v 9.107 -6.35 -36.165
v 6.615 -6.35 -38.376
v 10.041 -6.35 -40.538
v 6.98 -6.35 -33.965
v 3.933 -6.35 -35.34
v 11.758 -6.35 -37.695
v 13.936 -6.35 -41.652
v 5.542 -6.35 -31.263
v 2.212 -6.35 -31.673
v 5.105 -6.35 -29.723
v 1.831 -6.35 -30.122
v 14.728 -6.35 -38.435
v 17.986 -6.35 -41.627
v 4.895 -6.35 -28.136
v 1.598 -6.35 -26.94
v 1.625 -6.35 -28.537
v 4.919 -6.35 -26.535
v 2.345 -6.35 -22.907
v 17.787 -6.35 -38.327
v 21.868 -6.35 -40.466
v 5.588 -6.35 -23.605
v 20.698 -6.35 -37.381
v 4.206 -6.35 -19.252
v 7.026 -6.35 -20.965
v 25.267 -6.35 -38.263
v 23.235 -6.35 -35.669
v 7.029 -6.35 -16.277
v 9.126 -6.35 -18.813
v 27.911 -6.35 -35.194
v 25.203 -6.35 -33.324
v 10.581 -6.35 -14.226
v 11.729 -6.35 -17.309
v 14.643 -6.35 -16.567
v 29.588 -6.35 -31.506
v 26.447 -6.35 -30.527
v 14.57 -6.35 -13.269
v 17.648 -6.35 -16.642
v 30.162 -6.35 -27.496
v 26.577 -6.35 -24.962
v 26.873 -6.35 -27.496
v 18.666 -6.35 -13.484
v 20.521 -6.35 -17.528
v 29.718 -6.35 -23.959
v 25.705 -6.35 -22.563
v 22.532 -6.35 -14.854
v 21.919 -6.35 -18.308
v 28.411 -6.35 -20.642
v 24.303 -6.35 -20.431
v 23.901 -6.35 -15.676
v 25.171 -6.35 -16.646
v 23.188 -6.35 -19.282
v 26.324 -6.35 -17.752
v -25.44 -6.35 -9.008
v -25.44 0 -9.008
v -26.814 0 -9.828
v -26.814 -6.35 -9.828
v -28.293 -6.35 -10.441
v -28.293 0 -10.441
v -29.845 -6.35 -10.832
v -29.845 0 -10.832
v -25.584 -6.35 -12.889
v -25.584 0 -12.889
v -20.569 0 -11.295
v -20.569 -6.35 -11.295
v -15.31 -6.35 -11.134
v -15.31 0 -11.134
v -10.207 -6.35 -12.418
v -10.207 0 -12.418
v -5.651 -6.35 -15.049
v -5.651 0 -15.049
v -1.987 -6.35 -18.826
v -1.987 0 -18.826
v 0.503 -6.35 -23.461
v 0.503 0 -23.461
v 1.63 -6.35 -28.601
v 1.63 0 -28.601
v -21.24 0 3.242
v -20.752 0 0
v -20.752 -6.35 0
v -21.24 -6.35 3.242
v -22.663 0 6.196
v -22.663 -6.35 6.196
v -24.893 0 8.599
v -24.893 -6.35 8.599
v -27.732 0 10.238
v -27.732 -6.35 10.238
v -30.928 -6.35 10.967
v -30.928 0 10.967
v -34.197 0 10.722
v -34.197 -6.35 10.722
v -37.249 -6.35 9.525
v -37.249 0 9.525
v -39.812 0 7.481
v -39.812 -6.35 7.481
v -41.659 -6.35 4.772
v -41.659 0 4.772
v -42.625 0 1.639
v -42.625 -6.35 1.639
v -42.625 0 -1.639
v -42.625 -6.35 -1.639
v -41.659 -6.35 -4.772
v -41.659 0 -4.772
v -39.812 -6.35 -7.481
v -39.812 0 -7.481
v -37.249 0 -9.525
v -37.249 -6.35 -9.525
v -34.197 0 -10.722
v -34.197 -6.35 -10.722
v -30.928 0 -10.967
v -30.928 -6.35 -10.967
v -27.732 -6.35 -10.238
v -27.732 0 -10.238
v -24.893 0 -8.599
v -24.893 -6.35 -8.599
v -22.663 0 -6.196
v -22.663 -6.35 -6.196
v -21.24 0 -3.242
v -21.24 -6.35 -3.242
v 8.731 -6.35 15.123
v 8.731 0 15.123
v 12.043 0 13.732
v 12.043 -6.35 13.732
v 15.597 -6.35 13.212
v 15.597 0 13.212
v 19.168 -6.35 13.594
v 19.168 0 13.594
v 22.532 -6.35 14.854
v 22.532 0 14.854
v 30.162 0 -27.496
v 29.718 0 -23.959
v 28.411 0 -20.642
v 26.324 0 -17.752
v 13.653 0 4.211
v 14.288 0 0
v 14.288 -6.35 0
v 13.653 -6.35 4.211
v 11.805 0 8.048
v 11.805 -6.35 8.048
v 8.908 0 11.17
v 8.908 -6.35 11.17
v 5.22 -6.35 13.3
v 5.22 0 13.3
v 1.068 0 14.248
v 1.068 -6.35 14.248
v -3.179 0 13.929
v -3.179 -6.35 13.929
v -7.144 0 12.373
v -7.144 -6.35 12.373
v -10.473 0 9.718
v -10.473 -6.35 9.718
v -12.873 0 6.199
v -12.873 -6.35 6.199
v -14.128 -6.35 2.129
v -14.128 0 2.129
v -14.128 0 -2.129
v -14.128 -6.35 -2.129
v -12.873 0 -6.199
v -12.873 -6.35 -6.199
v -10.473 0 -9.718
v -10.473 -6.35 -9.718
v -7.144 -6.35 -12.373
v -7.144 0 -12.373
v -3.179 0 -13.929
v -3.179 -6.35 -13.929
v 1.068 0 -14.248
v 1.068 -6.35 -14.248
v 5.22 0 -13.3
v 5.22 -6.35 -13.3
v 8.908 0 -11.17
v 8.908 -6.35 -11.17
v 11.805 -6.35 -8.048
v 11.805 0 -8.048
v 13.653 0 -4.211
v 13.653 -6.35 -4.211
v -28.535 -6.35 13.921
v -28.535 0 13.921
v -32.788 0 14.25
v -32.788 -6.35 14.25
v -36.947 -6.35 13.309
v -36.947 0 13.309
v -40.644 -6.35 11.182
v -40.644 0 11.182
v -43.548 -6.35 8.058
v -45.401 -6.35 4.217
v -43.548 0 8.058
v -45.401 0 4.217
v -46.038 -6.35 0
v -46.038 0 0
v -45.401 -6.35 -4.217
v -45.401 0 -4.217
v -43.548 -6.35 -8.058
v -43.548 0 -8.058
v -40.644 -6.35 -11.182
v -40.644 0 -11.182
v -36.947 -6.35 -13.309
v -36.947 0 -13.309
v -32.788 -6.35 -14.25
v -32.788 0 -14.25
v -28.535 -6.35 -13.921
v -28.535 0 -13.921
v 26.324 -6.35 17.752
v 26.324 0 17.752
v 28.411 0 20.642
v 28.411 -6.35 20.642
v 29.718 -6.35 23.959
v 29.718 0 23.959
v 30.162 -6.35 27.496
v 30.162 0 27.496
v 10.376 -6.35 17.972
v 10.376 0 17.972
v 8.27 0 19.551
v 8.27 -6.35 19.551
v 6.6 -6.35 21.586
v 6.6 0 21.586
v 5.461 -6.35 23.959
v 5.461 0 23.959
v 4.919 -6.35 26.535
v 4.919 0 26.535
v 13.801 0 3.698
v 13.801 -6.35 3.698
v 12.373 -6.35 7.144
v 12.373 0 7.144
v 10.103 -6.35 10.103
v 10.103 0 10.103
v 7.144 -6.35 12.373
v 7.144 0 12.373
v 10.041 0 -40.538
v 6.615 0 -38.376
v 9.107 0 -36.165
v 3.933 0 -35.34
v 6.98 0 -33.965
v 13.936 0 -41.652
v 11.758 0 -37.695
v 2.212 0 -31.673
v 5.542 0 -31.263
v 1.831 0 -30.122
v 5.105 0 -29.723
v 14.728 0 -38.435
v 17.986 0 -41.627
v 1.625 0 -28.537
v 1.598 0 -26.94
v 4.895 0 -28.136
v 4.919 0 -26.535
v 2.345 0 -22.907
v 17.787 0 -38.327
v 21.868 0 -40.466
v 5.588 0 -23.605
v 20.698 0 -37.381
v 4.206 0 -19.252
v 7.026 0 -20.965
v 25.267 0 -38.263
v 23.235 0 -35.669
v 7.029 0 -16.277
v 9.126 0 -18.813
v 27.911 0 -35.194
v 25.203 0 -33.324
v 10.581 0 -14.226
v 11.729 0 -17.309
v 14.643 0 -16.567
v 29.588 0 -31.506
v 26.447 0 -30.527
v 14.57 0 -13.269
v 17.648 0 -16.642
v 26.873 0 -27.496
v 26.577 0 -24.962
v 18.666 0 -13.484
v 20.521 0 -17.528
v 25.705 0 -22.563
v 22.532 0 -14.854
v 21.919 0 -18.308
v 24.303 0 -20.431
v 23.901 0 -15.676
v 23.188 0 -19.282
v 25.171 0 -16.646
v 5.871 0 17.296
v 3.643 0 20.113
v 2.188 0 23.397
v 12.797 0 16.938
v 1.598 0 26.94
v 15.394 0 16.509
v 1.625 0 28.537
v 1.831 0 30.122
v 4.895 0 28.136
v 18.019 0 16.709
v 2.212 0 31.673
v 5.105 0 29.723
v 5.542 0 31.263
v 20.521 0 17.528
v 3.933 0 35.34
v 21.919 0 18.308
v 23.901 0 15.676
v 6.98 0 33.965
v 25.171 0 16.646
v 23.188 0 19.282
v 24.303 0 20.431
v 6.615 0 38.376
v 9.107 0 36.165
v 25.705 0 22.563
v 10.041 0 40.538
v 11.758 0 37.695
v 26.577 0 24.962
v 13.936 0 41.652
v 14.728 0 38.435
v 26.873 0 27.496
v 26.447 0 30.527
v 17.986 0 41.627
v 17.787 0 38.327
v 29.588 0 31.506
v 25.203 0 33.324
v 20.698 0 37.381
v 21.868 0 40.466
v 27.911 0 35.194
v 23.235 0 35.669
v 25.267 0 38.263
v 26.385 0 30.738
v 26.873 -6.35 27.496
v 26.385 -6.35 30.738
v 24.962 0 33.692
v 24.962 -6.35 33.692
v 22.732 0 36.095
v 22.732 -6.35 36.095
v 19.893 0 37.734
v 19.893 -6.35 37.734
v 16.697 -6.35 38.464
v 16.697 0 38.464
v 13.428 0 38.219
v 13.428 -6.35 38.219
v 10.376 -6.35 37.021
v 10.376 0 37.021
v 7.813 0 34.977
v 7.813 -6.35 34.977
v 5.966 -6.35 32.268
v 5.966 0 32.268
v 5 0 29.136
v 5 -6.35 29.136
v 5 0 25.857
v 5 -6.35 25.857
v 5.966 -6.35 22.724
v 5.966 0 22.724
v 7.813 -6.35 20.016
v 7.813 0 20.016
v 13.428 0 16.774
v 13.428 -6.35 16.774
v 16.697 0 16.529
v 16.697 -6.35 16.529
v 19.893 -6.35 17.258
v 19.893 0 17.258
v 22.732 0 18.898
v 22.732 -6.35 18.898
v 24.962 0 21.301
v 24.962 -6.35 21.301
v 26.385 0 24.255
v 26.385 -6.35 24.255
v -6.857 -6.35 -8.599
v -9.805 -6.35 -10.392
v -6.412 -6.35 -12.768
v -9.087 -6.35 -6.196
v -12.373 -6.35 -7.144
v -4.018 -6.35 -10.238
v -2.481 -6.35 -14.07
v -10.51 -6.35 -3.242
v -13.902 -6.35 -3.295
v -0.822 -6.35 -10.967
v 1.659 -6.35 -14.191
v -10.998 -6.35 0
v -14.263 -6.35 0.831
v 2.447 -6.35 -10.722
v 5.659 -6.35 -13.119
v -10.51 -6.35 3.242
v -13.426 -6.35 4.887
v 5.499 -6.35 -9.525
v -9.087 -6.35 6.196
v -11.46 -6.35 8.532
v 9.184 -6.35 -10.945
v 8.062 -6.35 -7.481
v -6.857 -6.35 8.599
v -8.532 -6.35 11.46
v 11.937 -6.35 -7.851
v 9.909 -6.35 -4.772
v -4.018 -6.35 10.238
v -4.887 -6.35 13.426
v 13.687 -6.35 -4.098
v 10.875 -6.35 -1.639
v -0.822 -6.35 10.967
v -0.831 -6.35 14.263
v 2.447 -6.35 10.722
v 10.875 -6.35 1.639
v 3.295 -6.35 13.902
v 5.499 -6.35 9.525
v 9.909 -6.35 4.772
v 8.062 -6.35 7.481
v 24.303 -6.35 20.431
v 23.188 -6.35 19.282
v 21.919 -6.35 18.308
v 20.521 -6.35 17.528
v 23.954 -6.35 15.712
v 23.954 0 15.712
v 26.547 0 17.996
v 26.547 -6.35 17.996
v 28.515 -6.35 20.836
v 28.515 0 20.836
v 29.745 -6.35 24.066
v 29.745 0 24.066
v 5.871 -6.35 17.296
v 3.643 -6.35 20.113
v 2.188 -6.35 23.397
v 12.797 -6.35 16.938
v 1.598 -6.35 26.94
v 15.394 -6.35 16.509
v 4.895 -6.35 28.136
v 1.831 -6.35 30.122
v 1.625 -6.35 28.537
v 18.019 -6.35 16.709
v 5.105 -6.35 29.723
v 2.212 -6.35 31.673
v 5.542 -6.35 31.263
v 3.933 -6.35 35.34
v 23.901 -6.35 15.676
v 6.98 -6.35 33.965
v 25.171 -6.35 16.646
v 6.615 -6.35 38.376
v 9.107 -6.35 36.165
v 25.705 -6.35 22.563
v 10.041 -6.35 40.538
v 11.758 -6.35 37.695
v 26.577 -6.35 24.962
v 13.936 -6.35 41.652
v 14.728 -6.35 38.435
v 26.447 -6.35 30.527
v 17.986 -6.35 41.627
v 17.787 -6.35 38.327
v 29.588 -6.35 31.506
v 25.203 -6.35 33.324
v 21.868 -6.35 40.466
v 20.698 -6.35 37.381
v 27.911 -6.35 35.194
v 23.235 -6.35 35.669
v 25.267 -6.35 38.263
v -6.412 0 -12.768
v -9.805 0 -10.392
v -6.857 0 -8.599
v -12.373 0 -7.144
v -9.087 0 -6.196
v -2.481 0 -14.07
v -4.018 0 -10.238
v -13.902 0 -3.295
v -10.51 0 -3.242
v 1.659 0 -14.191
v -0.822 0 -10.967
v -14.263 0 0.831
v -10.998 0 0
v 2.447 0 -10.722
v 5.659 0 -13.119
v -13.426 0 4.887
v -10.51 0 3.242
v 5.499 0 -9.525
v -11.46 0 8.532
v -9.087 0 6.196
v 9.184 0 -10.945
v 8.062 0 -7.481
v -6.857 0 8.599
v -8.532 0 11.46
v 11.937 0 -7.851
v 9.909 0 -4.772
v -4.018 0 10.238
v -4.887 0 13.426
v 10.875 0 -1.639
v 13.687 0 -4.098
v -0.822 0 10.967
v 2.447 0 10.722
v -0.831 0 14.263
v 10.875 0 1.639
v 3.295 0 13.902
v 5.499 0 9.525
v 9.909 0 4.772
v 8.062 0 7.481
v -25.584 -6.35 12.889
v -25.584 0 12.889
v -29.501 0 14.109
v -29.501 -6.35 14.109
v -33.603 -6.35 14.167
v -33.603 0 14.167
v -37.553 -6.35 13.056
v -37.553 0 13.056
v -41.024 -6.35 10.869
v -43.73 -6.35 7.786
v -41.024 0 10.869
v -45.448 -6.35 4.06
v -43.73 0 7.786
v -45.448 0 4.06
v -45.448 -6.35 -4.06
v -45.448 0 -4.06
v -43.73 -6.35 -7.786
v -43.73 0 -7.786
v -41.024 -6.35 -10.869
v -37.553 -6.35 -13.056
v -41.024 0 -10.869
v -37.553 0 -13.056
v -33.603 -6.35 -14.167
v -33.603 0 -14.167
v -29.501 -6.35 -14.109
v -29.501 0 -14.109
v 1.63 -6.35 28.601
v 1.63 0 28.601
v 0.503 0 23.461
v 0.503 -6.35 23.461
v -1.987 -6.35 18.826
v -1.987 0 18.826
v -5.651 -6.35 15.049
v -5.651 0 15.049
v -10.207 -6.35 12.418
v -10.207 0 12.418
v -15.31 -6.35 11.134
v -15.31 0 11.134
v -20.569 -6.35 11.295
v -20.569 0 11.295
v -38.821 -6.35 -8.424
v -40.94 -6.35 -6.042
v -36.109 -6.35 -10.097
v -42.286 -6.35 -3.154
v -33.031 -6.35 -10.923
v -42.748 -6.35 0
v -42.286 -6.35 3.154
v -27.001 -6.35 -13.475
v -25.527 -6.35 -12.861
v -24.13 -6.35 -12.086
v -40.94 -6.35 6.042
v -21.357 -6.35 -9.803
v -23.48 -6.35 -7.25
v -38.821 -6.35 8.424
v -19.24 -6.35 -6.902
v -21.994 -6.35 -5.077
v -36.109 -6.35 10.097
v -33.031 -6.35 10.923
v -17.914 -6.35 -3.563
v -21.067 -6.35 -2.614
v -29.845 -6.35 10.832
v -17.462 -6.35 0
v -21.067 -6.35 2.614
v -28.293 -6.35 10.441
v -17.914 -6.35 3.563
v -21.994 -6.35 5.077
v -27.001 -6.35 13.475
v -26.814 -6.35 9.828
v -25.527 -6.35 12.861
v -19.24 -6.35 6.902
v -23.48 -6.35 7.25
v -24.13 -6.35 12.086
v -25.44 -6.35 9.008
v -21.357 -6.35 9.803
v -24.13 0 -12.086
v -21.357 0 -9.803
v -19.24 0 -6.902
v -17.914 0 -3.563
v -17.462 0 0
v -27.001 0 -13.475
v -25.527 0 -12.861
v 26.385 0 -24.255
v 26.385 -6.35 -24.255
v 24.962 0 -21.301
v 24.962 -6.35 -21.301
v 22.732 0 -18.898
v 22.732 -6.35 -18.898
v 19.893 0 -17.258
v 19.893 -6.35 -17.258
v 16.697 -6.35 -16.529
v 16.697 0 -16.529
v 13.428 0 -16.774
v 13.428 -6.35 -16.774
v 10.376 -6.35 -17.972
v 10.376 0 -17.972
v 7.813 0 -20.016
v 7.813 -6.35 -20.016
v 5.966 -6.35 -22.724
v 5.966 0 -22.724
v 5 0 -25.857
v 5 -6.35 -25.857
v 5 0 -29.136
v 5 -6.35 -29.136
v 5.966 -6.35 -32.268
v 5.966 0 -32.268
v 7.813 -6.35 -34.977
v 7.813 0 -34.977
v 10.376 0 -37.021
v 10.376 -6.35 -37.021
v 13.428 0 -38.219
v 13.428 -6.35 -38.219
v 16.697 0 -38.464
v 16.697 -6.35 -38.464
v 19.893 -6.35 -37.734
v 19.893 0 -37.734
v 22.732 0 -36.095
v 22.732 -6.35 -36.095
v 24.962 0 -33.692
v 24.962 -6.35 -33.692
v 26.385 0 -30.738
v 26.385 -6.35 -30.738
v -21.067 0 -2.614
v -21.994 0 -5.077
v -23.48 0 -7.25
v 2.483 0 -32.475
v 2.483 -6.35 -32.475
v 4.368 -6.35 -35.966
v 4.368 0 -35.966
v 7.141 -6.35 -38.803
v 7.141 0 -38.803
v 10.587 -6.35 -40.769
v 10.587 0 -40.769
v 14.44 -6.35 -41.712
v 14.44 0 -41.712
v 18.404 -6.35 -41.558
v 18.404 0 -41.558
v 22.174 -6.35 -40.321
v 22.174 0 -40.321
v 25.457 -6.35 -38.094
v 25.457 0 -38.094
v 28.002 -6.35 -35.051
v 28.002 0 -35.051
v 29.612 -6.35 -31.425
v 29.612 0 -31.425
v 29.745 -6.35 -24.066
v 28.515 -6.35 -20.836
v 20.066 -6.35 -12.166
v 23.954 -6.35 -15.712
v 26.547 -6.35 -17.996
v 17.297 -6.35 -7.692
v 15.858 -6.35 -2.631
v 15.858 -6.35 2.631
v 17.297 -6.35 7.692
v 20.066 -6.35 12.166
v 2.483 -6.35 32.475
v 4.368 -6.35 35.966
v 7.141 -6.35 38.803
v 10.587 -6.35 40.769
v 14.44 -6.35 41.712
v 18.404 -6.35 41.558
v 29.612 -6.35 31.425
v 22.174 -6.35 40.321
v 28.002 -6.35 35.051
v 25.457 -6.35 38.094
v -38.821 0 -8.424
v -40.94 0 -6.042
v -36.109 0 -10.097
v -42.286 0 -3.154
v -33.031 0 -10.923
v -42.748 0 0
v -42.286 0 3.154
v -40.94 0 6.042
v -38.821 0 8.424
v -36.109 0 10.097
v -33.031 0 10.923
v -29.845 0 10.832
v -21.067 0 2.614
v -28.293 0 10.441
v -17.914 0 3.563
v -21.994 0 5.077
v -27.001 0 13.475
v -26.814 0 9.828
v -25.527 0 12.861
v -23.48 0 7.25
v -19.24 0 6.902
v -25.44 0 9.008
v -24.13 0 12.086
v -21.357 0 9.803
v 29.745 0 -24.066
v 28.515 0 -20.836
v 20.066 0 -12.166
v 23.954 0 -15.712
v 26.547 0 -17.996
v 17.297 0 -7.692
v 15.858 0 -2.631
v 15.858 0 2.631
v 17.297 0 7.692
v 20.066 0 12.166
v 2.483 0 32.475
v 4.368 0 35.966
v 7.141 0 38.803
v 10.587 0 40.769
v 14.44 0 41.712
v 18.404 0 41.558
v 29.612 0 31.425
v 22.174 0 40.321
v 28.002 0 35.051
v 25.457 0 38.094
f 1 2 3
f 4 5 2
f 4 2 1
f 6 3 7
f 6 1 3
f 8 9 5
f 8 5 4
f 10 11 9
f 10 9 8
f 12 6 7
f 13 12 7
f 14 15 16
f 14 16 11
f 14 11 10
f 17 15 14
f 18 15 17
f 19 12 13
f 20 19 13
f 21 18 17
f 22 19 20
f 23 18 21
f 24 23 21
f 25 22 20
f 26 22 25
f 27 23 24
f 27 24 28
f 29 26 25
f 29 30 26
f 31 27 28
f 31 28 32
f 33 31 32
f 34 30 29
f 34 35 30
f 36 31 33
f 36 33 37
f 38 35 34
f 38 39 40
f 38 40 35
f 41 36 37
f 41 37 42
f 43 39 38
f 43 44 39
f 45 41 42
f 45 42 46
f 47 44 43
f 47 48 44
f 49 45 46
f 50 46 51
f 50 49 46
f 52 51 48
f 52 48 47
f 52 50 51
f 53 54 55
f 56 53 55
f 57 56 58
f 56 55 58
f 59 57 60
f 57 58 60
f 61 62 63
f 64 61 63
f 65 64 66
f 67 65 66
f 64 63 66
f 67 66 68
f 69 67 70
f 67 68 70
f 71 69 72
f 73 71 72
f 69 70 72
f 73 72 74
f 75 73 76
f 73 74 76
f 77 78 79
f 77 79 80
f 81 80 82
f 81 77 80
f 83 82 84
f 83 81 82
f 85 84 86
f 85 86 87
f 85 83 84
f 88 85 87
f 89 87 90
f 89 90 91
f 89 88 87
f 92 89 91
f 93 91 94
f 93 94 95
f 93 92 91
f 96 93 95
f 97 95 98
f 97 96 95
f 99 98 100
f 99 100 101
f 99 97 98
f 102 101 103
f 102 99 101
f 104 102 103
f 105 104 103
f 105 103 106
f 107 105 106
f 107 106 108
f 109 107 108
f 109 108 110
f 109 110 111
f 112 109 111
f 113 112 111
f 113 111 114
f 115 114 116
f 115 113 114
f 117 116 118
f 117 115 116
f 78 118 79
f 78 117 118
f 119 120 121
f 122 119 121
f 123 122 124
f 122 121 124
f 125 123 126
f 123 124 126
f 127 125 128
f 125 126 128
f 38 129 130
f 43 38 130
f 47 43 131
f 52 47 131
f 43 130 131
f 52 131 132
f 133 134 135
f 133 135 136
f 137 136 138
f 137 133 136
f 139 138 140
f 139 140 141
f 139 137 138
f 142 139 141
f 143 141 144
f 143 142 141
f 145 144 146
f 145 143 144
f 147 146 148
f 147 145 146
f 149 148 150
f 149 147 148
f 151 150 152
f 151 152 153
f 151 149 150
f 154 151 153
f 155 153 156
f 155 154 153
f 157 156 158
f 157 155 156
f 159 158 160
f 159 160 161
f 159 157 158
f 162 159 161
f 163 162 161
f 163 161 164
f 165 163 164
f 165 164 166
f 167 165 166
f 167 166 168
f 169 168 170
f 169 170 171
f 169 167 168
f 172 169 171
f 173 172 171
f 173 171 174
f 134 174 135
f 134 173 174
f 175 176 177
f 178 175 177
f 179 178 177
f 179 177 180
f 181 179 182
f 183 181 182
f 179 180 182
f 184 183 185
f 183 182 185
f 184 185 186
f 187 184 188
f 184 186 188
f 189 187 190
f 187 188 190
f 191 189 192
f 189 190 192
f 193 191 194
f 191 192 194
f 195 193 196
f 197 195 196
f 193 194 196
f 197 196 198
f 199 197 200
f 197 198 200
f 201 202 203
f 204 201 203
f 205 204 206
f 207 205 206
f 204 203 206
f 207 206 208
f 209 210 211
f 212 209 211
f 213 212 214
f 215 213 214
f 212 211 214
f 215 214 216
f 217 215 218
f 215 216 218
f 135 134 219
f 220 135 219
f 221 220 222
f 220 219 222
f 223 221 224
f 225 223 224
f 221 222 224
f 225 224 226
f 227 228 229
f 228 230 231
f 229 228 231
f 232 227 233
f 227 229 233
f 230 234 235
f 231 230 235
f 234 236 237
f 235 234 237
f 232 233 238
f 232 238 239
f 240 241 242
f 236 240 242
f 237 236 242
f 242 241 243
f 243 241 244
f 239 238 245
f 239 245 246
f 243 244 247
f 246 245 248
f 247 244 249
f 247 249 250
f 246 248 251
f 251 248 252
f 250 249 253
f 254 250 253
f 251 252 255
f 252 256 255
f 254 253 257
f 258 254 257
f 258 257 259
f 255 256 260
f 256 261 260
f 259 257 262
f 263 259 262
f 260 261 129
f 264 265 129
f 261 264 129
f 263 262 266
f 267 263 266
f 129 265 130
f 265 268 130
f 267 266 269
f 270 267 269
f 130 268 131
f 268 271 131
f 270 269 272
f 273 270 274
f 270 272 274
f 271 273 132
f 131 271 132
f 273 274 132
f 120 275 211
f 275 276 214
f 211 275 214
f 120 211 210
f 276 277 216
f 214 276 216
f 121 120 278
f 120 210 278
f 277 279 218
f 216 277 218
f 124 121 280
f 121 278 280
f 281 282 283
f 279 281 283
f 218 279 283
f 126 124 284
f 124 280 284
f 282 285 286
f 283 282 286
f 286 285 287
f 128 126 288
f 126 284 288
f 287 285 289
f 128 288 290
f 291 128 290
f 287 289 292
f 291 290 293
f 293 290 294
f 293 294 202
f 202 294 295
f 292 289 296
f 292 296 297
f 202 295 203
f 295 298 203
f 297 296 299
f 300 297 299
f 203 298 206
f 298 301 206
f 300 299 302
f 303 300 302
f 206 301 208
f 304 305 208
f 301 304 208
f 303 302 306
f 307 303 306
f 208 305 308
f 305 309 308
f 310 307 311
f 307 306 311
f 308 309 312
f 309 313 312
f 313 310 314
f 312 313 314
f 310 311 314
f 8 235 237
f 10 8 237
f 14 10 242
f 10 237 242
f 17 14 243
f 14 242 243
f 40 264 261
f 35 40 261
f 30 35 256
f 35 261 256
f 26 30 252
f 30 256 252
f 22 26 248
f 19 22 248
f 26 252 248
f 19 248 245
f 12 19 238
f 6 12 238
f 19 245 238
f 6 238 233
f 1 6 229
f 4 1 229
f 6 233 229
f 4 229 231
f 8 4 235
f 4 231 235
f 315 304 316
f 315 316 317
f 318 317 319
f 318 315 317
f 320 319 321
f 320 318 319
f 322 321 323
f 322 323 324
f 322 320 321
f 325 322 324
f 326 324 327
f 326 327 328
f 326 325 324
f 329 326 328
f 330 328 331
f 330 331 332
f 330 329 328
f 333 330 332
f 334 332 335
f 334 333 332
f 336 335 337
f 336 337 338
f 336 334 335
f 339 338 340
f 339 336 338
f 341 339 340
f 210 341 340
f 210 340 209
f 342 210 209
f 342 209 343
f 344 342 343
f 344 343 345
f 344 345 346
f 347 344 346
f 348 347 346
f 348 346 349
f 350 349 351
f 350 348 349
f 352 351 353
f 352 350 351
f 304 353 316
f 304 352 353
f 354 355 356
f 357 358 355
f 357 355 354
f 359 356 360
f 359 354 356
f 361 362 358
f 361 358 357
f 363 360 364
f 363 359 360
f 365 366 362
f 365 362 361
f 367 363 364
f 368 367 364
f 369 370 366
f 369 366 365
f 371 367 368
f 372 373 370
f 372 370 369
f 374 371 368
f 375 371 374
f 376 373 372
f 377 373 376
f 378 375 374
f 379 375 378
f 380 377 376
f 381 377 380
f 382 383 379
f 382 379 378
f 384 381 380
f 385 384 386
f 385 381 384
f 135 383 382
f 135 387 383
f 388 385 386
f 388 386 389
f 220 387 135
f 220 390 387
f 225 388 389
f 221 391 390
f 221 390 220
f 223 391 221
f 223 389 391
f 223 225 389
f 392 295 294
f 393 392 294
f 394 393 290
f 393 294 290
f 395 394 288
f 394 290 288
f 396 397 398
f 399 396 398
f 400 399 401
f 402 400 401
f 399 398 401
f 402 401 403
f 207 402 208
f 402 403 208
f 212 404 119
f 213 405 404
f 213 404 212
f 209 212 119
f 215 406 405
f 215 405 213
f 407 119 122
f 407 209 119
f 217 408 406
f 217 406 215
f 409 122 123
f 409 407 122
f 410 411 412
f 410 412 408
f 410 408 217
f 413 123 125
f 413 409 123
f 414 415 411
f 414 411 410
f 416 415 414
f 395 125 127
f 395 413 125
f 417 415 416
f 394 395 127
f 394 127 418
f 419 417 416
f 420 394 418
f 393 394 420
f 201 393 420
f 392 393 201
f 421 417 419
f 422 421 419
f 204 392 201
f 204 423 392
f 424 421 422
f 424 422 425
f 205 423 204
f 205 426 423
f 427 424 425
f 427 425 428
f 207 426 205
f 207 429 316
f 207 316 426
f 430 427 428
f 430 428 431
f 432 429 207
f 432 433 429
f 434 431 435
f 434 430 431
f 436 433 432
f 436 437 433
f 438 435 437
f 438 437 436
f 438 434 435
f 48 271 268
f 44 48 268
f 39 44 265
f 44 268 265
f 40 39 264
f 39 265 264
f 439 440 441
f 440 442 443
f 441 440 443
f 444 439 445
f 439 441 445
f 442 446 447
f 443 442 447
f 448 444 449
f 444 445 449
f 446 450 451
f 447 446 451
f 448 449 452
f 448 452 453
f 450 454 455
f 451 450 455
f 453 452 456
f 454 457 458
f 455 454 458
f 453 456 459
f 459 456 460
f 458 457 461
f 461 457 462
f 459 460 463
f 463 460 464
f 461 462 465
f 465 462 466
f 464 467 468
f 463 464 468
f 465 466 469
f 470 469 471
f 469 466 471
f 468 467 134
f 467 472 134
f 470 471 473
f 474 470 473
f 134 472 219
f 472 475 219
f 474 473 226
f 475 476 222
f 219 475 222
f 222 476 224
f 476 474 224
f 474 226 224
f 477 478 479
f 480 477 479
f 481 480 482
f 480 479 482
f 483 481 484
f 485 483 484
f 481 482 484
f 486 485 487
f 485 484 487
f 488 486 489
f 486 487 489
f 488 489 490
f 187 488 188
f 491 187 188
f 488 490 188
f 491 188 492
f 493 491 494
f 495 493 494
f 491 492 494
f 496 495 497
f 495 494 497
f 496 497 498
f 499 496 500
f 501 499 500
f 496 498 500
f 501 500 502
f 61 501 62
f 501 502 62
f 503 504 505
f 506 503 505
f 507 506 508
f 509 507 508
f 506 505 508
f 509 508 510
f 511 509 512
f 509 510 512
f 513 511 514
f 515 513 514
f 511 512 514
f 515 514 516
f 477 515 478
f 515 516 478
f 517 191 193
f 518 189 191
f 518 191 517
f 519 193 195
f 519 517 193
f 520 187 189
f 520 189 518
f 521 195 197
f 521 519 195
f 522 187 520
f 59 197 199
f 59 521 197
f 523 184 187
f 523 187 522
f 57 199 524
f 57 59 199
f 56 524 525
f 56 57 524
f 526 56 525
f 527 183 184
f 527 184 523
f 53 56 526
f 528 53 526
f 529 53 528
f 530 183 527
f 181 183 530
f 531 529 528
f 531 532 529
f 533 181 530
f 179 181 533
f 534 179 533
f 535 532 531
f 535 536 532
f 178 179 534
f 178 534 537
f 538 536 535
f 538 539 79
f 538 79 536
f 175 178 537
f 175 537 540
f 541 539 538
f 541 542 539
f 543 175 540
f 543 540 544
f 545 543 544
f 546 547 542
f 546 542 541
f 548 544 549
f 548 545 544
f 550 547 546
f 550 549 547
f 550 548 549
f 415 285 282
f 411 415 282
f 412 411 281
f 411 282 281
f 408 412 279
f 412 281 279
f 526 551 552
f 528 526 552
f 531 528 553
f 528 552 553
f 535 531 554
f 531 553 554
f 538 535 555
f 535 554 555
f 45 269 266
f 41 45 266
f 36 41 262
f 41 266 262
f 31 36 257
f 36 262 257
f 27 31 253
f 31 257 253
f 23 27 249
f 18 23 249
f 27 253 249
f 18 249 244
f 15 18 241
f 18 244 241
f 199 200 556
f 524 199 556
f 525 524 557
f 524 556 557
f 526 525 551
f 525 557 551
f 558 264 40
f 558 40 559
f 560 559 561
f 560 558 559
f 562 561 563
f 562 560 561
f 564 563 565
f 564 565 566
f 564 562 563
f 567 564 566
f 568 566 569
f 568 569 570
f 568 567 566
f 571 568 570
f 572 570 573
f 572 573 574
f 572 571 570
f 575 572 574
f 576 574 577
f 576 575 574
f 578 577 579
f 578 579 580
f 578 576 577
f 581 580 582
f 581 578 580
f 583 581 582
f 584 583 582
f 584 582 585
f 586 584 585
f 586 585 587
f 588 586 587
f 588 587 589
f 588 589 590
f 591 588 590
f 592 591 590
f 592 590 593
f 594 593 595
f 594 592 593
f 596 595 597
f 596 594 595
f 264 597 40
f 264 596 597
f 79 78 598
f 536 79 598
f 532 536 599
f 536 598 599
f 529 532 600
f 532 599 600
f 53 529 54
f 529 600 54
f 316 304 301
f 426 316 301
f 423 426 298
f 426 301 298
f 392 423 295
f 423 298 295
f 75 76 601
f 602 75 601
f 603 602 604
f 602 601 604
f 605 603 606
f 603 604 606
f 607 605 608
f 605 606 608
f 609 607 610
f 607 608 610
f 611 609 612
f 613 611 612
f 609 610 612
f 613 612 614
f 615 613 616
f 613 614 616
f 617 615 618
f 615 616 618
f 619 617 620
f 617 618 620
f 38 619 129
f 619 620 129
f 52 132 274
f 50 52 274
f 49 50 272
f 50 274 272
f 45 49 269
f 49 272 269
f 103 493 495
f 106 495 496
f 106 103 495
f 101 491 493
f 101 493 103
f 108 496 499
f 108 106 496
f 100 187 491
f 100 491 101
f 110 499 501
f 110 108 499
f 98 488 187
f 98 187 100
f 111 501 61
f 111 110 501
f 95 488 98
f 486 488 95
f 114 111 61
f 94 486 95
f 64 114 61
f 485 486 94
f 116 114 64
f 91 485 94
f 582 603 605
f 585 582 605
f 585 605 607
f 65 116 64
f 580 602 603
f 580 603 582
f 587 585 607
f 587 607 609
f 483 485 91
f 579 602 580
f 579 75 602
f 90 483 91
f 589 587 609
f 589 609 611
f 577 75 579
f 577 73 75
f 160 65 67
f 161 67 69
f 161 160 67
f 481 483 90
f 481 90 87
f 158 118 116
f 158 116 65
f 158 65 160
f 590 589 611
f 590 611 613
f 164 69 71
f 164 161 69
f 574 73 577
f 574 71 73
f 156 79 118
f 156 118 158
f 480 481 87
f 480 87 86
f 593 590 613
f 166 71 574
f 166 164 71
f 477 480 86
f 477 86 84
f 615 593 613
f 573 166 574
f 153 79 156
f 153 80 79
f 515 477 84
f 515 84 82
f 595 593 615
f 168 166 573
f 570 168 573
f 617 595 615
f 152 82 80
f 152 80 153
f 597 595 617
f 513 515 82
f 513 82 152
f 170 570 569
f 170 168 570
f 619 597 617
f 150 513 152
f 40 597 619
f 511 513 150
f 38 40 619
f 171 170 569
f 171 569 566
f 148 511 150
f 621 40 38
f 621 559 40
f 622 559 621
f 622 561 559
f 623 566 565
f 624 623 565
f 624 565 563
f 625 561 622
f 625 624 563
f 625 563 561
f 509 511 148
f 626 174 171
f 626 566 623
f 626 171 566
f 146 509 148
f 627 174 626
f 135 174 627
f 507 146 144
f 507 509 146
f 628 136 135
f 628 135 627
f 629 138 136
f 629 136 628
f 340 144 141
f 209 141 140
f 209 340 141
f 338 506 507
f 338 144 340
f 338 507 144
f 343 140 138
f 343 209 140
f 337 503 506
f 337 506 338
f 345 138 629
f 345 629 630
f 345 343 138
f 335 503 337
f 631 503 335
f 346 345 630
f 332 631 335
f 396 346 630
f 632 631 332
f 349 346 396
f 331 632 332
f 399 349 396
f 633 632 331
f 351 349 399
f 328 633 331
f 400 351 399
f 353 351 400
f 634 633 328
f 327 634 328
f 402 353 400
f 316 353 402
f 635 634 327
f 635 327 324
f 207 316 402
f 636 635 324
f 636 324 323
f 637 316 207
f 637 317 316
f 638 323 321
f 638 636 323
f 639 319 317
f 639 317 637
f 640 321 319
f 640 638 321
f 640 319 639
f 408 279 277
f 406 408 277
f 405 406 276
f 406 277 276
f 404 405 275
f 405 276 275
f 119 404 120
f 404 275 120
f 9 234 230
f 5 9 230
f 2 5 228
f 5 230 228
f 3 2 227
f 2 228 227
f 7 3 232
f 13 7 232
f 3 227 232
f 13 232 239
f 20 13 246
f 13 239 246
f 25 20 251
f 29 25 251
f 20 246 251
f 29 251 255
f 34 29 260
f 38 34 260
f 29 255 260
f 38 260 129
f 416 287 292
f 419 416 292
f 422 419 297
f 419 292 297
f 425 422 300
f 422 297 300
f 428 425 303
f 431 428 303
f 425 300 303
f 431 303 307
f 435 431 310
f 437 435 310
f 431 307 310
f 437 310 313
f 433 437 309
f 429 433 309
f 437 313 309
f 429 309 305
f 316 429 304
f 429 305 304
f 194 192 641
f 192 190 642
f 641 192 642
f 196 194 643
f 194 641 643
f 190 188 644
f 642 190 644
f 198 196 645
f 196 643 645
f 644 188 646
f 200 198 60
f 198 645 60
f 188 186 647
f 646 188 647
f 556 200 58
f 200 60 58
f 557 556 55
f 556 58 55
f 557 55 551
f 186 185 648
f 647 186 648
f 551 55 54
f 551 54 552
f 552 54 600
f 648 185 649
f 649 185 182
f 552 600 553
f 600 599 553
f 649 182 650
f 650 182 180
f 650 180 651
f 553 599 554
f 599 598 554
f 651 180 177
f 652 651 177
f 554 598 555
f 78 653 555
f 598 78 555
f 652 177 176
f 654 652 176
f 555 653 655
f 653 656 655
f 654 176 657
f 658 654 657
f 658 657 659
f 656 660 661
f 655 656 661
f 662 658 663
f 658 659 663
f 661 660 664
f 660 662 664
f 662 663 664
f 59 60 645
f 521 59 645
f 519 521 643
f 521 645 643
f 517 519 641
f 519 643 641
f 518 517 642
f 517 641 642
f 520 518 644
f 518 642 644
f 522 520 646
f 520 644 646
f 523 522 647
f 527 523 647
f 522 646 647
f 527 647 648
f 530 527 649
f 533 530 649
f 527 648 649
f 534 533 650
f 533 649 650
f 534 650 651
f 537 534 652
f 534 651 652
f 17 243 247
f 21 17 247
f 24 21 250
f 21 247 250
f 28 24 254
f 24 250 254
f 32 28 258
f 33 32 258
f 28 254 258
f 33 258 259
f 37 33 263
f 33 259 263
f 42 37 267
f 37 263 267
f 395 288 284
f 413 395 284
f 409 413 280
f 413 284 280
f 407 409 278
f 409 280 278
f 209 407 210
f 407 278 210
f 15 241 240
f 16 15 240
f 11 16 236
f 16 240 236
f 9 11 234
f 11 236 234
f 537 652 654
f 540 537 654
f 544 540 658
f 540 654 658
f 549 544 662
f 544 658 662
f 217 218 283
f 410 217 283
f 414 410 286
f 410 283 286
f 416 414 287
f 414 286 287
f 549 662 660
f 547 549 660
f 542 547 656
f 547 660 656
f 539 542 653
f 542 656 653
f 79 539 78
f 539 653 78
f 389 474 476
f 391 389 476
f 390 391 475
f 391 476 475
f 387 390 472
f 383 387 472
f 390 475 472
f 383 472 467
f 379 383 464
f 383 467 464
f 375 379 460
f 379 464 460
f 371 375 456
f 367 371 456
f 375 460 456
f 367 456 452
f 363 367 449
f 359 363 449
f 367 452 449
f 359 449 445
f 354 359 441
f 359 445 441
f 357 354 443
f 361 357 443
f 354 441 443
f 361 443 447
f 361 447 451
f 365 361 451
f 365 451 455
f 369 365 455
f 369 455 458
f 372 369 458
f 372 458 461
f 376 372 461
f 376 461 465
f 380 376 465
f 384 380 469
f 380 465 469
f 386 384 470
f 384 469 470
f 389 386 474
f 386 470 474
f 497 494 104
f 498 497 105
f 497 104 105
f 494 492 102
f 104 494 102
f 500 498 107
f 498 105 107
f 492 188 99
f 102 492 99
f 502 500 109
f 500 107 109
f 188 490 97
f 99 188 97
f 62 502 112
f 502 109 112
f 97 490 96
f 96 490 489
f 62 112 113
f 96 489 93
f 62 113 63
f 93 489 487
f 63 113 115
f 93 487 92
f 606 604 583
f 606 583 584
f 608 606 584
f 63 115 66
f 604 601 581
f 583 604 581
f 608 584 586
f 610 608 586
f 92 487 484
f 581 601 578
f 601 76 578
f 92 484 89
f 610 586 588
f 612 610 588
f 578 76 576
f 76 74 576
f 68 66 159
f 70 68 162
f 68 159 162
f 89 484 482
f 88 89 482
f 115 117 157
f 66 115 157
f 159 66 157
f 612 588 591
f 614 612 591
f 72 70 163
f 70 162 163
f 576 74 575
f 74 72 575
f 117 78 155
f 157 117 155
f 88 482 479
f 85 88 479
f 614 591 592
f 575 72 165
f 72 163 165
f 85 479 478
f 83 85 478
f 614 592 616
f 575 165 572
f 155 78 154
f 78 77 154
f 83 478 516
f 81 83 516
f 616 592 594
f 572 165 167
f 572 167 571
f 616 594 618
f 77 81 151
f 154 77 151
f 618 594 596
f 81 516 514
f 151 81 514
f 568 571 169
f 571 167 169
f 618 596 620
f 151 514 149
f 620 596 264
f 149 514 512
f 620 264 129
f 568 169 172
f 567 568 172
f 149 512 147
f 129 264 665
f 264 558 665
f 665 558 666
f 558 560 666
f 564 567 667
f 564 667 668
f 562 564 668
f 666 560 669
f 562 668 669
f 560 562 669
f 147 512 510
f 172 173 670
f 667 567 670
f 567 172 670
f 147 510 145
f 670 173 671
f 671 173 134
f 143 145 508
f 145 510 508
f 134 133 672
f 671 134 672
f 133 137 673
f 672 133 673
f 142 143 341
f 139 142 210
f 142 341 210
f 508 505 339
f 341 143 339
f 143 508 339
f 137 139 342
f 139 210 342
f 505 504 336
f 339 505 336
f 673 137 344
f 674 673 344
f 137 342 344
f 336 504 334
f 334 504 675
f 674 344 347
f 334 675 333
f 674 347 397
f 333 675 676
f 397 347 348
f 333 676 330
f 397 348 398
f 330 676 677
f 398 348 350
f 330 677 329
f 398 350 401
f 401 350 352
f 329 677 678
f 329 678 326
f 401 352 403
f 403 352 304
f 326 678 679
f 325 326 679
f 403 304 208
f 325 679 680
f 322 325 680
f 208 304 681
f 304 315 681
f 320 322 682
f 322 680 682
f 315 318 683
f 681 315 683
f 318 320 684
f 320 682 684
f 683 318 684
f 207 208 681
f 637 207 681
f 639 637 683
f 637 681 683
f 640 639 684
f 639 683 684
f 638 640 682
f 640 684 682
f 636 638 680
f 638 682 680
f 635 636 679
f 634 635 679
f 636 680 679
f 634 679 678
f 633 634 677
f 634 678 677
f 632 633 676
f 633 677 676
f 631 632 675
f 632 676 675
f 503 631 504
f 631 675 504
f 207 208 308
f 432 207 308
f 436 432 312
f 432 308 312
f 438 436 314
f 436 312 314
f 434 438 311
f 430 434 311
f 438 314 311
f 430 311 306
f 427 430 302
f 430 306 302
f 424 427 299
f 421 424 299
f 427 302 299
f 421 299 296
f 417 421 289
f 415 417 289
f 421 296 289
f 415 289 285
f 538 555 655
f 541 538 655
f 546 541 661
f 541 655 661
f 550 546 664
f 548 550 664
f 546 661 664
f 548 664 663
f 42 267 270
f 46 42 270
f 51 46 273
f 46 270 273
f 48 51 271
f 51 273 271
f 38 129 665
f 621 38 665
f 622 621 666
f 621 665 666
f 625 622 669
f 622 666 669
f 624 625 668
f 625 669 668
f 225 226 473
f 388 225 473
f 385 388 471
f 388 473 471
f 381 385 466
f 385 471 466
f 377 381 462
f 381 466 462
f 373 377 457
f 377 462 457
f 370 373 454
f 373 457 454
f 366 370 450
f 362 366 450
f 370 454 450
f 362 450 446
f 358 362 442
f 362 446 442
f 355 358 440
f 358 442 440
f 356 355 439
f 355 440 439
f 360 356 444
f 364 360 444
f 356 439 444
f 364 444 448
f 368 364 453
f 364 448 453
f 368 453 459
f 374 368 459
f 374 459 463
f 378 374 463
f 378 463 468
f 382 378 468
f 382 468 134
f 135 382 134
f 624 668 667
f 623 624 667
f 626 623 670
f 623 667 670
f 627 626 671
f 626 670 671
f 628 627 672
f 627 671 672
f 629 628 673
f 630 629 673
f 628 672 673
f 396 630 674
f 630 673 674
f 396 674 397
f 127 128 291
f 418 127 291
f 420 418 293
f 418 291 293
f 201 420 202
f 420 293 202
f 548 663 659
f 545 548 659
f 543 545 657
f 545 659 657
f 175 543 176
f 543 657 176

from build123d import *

# Parameters (mm, degrees)
F1_R     = 10.9982
F1_R_2   = 14.2875
F2_DEPTH = 6.35


with BuildPart() as f2:
    # F1 (on Front) → F2 (new body)
    with BuildSketch(Plane.XZ):
        with BuildLine():
            ThreePointArc((30.1625, 27.4963065702), (16.4276008155, 41.7731160383), (1.6302461293, 28.6006812411))
            ThreePointArc((1.6302461293, 28.6006812411), (8.73125, 15.1229686136), (23.9537934556, 15.7121751829))
            ThreePointArc((23.9537934556, 15.7121751829), (28.5153800921, 20.8364681805), (30.1625, 27.4963065702))
        make_face()
        with Locations((15.875, 27.4963065702)):
            Circle(F1_R, mode=Mode.SUBTRACT)
        with BuildLine():
            ThreePointArc((23.9537934556, -15.7121751829), (8.73125, -15.1229686136), (1.6302461293, -28.6006812411))
            ThreePointArc((1.6302461293, -28.6006812411), (16.4276008155, -41.7731160383), (30.1625, -27.4963065702))
            ThreePointArc((30.1625, -27.4963065702), (28.5153800921, -20.8364681805), (23.9537934556, -15.7121751829))
        make_face()
        with Locations((15.875, -27.4963065702)):
            Circle(F1_R, mode=Mode.SUBTRACT)
        with BuildLine():
            ThreePointArc((-17.4625, 0), (-19.6622207234, 7.6169710785), (-25.584039585, 12.8885060581))
            ThreePointArc((-25.584039585, 12.8885060581), (-46.0375, 0), (-25.584039585, -12.8885060581))
            ThreePointArc((-25.584039585, -12.8885060581), (-19.6622207234, -7.6169710785), (-17.4625, 0))
        make_face()
        with Locations((-31.75, 0)):
            Circle(F1_R, mode=Mode.SUBTRACT)
        with BuildLine():
            ThreePointArc((1.6302461293, 28.6006812411), (-7.8377590316, 13.5753968602), (-25.584039585, 12.8885060581))
            ThreePointArc((-25.584039585, 12.8885060581), (-19.6622207234, 7.6169710785), (-17.4625, 0))
            ThreePointArc((-17.4625, 0), (-19.6622207234, -7.6169710785), (-25.584039585, -12.8885060581))
            ThreePointArc((-25.584039585, -12.8885060581), (-7.8377590316, -13.5753968602), (1.6302461293, -28.6006812411))
            ThreePointArc((1.6302461293, -28.6006812411), (8.73125, -15.1229686136), (23.9537934556, -15.7121751829))
            ThreePointArc((23.9537934556, -15.7121751829), (15.6755180632, 0), (23.9537934556, 15.7121751829))
            ThreePointArc((23.9537934556, 15.7121751829), (8.73125, 15.1229686136), (1.6302461293, 28.6006812411))
        make_face()
        Circle(F1_R_2, mode=Mode.SUBTRACT)
    extrude(amount=F2_DEPTH)


with BuildPart() as f2b:
    # F0 (on Front) → F2, piece 2 (new body)
    with BuildSketch(Plane.XZ):
        with BuildLine():
            ThreePointArc((-25.43979926, 9.0078726601), (-24.8326351147, 10.5671845593), (-24.13, 12.0858701073))
            ThreePointArc((-24.13, 12.0858701073), (-26.2554866329, 13.1887444099), (-28.5353125, 13.9211508334))
            ThreePointArc((-28.5353125, 13.9211508334), (-29.2310490293, 12.3938804515), (-29.84511176, 10.8319806145))
            ThreePointArc((-29.84511176, 10.8319806145), (-27.5424158719, 10.1615273973), (-25.43979926, 9.0078726601))
        make_face()
        with BuildLine():
            ThreePointArc((-29.84511176, 10.8319806145), (-29.2310490293, 12.3938804515), (-28.5353125, 13.9211508334))
            ThreePointArc((-28.5353125, 13.9211508334), (-46.0375, 0), (-28.5353125, -13.9211508334))
            ThreePointArc((-28.5353125, -13.9211508334), (-29.2310490293, -12.3938804515), (-29.84511176, -10.8319806145))
            ThreePointArc((-29.84511176, -10.8319806145), (-42.7482, 0), (-29.84511176, 10.8319806145))
        make_face()
        with BuildLine():
            ThreePointArc((-29.84511176, -10.8319806145), (-29.2310490293, -12.3938804515), (-28.5353125, -13.9211508334))
            ThreePointArc((-28.5353125, -13.9211508334), (-26.2554866329, -13.1887444099), (-24.13, -12.0858701073))
            ThreePointArc((-24.13, -12.0858701073), (-24.8326351147, -10.5671845593), (-25.43979926, -9.0078726601))
            ThreePointArc((-25.43979926, -9.0078726601), (-27.5424158719, -10.1615273973), (-29.84511176, -10.8319806145))
        make_face()
        with BuildLine():
            ThreePointArc((-17.4625, 0), (-19.2399359264, 6.9015181754), (-24.13, 12.0858701073))
            ThreePointArc((-24.13, 12.0858701073), (-24.8326351147, 10.5671845593), (-25.43979926, 9.0078726601))
            ThreePointArc((-25.43979926, 9.0078726601), (-21.993944111, 5.0773789233), (-20.7518, 0))
            ThreePointArc((-20.7518, 0), (-21.993944111, -5.0773789233), (-25.43979926, -9.0078726601))
            ThreePointArc((-25.43979926, -9.0078726601), (-24.8326351147, -10.5671845593), (-24.13, -12.0858701073))
            ThreePointArc((-24.13, -12.0858701073), (-19.2399359264, -6.9015181754), (-17.4625, 0))
        make_face()
    extrude(amount=F2_DEPTH)


with BuildPart() as f2c:
    # F0 (on Front) → F2, piece 3 (new body)
    with BuildSketch(Plane.XZ):
        with BuildLine():
            ThreePointArc((7.14375, 12.3733379566), (-12.3733379566, -7.14375), (14.2875, 0))
            ThreePointArc((14.2875, 0), (12.3733379566, 7.14375), (7.14375, 12.3733379566))
        make_face()
        with BuildLine():
            ThreePointArc((10.9982, 0), (-9.5247205959, -5.4991), (5.4991, 9.5247205959))
            ThreePointArc((5.4991, 9.5247205959), (9.5247205959, 5.4991), (10.9982, 0))
        make_face(mode=Mode.SUBTRACT)
    extrude(amount=F2_DEPTH)


with BuildPart() as f2d:
    # F0 (on Front) → F2, piece 4 (new body)
    with BuildSketch(Plane.XZ):
        with BuildLine():
            ThreePointArc((2.2115859783, 31.6728809466), (1.7059556135, 29.3322906177), (1.5983294603, 26.940128047))
            ThreePointArc((1.5983294603, 26.940128047), (3.2648672826, 26.7892851319), (4.9188530723, 26.5354487564))
            ThreePointArc((4.9188530723, 26.5354487564), (4.9710670687, 28.9331955253), (5.5417854945, 31.2626152702))
            ThreePointArc((5.5417854945, 31.2626152702), (3.8821091922, 31.5117712644), (2.2115859783, 31.6728809466))
        make_face()
        with BuildLine():
            ThreePointArc((1.5983294603, 26.940128047), (3.6430778987, 20.1130323672), (8.73125, 15.1229686136))
            Line((8.73125, 15.1229686136), (10.3759, 17.9715859743))
            ThreePointArc((10.3759, 17.9715859743), (6.5998329233, 21.5860037912), (4.9188530723, 26.5354487564))
            ThreePointArc((4.9188530723, 26.5354487564), (3.2648672826, 26.7892851319), (1.5983294603, 26.940128047))
        make_face()
        with BuildLine():
            Line((10.3759, 17.9715859743), (8.73125, 15.1229686136))
            ThreePointArc((8.73125, 15.1229686136), (15.5968580278, 13.2115141918), (22.5316705397, 14.8542579397))
            ThreePointArc((22.5316705397, 14.8542579397), (21.5677678322, 16.2221005726), (20.5209461877, 17.5275760963))
            ThreePointArc((20.5209461877, 17.5275760963), (15.3941111877, 16.5086248679), (10.3759, 17.9715859743))
        make_face()
        with BuildLine():
            ThreePointArc((20.5209461877, 17.5275760963), (21.5677678322, 16.2221005726), (22.5316705397, 14.8542579397))
            ThreePointArc((22.5316705397, 14.8542579397), (24.5495310194, 16.1435462079), (26.3237265217, 17.7517301132))
            ThreePointArc((26.3237265217, 17.7517301132), (25.3489398371, 19.1178908129), (24.3033262655, 20.4306346557))
            ThreePointArc((24.3033262655, 20.4306346557), (22.5713488033, 18.7716681281), (20.5209461877, 17.5275760963))
        make_face()
        with BuildLine():
            ThreePointArc((30.1625, 27.4963065702), (17.9864720476, 41.6269237556), (2.2115859783, 31.6728809466))
            ThreePointArc((2.2115859783, 31.6728809466), (3.8821091922, 31.5117712644), (5.5417854945, 31.2626152702))
            ThreePointArc((5.5417854945, 31.2626152702), (17.7872818132, 38.3269843655), (26.8732, 27.4963065702))
            ThreePointArc((26.8732, 27.4963065702), (26.2107830176, 23.7370523019), (24.3033262655, 20.4306346557))
            ThreePointArc((24.3033262655, 20.4306346557), (25.3489398371, 19.1178908129), (26.3237265217, 17.7517301132))
            ThreePointArc((26.3237265217, 17.7517301132), (29.1682094776, 22.25958641), (30.1625, 27.4963065702))
        make_face()
    extrude(amount=F2_DEPTH)


with BuildPart() as f2e:
    # F0 (on Front) → F2, piece 5 (new body)
    with BuildSketch(Plane.XZ):
        with BuildLine():
            ThreePointArc((26.3237265217, -17.7517301132), (24.5495310194, -16.1435462079), (22.5316705397, -14.8542579397))
            ThreePointArc((22.5316705397, -14.8542579397), (21.5677678322, -16.2221005726), (20.5209461877, -17.5275760963))
            ThreePointArc((20.5209461877, -17.5275760963), (22.5713488033, -18.7716681281), (24.3033262655, -20.4306346557))
            ThreePointArc((24.3033262655, -20.4306346557), (25.3489398371, -19.1178908129), (26.3237265217, -17.7517301132))
        make_face()
        with BuildLine():
            ThreePointArc((20.5209461877, -17.5275760963), (21.5677678322, -16.2221005726), (22.5316705397, -14.8542579397))
            ThreePointArc((22.5316705397, -14.8542579397), (8.73125, -15.1229686136), (1.5983294603, -26.940128047))
            ThreePointArc((1.5983294603, -26.940128047), (3.2648672826, -26.7892851319), (4.9188530723, -26.5354487564))
            ThreePointArc((4.9188530723, -26.5354487564), (10.3759, -17.9715859743), (20.5209461877, -17.5275760963))
        make_face()
        with BuildLine():
            ThreePointArc((4.9188530723, -26.5354487564), (3.2648672826, -26.7892851319), (1.5983294603, -26.940128047))
            ThreePointArc((1.5983294603, -26.940128047), (1.7059556135, -29.3322906177), (2.2115859783, -31.6728809466))
            ThreePointArc((2.2115859783, -31.6728809466), (3.8821091922, -31.5117712644), (5.5417854945, -31.2626152702))
            ThreePointArc((5.5417854945, -31.2626152702), (4.9710670687, -28.9331955253), (4.9188530723, -26.5354487564))
        make_face()
        with BuildLine():
            ThreePointArc((30.1625, -27.4963065702), (29.1682094776, -22.25958641), (26.3237265217, -17.7517301132))
            ThreePointArc((26.3237265217, -17.7517301132), (25.3489398371, -19.1178908129), (24.3033262655, -20.4306346557))
            ThreePointArc((24.3033262655, -20.4306346557), (26.2107830176, -23.7370523019), (26.8732, -27.4963065702))
            ThreePointArc((26.8732, -27.4963065702), (17.7872818132, -38.3269843655), (5.5417854945, -31.2626152702))
            ThreePointArc((5.5417854945, -31.2626152702), (3.8821091922, -31.5117712644), (2.2115859783, -31.6728809466))
            ThreePointArc((2.2115859783, -31.6728809466), (17.9864720476, -41.6269237556), (30.1625, -27.4963065702))
        make_face()
    extrude(amount=F2_DEPTH)


solid = Compound([f2.part, f2b.part, f2c.part, f2d.part, f2e.part])
